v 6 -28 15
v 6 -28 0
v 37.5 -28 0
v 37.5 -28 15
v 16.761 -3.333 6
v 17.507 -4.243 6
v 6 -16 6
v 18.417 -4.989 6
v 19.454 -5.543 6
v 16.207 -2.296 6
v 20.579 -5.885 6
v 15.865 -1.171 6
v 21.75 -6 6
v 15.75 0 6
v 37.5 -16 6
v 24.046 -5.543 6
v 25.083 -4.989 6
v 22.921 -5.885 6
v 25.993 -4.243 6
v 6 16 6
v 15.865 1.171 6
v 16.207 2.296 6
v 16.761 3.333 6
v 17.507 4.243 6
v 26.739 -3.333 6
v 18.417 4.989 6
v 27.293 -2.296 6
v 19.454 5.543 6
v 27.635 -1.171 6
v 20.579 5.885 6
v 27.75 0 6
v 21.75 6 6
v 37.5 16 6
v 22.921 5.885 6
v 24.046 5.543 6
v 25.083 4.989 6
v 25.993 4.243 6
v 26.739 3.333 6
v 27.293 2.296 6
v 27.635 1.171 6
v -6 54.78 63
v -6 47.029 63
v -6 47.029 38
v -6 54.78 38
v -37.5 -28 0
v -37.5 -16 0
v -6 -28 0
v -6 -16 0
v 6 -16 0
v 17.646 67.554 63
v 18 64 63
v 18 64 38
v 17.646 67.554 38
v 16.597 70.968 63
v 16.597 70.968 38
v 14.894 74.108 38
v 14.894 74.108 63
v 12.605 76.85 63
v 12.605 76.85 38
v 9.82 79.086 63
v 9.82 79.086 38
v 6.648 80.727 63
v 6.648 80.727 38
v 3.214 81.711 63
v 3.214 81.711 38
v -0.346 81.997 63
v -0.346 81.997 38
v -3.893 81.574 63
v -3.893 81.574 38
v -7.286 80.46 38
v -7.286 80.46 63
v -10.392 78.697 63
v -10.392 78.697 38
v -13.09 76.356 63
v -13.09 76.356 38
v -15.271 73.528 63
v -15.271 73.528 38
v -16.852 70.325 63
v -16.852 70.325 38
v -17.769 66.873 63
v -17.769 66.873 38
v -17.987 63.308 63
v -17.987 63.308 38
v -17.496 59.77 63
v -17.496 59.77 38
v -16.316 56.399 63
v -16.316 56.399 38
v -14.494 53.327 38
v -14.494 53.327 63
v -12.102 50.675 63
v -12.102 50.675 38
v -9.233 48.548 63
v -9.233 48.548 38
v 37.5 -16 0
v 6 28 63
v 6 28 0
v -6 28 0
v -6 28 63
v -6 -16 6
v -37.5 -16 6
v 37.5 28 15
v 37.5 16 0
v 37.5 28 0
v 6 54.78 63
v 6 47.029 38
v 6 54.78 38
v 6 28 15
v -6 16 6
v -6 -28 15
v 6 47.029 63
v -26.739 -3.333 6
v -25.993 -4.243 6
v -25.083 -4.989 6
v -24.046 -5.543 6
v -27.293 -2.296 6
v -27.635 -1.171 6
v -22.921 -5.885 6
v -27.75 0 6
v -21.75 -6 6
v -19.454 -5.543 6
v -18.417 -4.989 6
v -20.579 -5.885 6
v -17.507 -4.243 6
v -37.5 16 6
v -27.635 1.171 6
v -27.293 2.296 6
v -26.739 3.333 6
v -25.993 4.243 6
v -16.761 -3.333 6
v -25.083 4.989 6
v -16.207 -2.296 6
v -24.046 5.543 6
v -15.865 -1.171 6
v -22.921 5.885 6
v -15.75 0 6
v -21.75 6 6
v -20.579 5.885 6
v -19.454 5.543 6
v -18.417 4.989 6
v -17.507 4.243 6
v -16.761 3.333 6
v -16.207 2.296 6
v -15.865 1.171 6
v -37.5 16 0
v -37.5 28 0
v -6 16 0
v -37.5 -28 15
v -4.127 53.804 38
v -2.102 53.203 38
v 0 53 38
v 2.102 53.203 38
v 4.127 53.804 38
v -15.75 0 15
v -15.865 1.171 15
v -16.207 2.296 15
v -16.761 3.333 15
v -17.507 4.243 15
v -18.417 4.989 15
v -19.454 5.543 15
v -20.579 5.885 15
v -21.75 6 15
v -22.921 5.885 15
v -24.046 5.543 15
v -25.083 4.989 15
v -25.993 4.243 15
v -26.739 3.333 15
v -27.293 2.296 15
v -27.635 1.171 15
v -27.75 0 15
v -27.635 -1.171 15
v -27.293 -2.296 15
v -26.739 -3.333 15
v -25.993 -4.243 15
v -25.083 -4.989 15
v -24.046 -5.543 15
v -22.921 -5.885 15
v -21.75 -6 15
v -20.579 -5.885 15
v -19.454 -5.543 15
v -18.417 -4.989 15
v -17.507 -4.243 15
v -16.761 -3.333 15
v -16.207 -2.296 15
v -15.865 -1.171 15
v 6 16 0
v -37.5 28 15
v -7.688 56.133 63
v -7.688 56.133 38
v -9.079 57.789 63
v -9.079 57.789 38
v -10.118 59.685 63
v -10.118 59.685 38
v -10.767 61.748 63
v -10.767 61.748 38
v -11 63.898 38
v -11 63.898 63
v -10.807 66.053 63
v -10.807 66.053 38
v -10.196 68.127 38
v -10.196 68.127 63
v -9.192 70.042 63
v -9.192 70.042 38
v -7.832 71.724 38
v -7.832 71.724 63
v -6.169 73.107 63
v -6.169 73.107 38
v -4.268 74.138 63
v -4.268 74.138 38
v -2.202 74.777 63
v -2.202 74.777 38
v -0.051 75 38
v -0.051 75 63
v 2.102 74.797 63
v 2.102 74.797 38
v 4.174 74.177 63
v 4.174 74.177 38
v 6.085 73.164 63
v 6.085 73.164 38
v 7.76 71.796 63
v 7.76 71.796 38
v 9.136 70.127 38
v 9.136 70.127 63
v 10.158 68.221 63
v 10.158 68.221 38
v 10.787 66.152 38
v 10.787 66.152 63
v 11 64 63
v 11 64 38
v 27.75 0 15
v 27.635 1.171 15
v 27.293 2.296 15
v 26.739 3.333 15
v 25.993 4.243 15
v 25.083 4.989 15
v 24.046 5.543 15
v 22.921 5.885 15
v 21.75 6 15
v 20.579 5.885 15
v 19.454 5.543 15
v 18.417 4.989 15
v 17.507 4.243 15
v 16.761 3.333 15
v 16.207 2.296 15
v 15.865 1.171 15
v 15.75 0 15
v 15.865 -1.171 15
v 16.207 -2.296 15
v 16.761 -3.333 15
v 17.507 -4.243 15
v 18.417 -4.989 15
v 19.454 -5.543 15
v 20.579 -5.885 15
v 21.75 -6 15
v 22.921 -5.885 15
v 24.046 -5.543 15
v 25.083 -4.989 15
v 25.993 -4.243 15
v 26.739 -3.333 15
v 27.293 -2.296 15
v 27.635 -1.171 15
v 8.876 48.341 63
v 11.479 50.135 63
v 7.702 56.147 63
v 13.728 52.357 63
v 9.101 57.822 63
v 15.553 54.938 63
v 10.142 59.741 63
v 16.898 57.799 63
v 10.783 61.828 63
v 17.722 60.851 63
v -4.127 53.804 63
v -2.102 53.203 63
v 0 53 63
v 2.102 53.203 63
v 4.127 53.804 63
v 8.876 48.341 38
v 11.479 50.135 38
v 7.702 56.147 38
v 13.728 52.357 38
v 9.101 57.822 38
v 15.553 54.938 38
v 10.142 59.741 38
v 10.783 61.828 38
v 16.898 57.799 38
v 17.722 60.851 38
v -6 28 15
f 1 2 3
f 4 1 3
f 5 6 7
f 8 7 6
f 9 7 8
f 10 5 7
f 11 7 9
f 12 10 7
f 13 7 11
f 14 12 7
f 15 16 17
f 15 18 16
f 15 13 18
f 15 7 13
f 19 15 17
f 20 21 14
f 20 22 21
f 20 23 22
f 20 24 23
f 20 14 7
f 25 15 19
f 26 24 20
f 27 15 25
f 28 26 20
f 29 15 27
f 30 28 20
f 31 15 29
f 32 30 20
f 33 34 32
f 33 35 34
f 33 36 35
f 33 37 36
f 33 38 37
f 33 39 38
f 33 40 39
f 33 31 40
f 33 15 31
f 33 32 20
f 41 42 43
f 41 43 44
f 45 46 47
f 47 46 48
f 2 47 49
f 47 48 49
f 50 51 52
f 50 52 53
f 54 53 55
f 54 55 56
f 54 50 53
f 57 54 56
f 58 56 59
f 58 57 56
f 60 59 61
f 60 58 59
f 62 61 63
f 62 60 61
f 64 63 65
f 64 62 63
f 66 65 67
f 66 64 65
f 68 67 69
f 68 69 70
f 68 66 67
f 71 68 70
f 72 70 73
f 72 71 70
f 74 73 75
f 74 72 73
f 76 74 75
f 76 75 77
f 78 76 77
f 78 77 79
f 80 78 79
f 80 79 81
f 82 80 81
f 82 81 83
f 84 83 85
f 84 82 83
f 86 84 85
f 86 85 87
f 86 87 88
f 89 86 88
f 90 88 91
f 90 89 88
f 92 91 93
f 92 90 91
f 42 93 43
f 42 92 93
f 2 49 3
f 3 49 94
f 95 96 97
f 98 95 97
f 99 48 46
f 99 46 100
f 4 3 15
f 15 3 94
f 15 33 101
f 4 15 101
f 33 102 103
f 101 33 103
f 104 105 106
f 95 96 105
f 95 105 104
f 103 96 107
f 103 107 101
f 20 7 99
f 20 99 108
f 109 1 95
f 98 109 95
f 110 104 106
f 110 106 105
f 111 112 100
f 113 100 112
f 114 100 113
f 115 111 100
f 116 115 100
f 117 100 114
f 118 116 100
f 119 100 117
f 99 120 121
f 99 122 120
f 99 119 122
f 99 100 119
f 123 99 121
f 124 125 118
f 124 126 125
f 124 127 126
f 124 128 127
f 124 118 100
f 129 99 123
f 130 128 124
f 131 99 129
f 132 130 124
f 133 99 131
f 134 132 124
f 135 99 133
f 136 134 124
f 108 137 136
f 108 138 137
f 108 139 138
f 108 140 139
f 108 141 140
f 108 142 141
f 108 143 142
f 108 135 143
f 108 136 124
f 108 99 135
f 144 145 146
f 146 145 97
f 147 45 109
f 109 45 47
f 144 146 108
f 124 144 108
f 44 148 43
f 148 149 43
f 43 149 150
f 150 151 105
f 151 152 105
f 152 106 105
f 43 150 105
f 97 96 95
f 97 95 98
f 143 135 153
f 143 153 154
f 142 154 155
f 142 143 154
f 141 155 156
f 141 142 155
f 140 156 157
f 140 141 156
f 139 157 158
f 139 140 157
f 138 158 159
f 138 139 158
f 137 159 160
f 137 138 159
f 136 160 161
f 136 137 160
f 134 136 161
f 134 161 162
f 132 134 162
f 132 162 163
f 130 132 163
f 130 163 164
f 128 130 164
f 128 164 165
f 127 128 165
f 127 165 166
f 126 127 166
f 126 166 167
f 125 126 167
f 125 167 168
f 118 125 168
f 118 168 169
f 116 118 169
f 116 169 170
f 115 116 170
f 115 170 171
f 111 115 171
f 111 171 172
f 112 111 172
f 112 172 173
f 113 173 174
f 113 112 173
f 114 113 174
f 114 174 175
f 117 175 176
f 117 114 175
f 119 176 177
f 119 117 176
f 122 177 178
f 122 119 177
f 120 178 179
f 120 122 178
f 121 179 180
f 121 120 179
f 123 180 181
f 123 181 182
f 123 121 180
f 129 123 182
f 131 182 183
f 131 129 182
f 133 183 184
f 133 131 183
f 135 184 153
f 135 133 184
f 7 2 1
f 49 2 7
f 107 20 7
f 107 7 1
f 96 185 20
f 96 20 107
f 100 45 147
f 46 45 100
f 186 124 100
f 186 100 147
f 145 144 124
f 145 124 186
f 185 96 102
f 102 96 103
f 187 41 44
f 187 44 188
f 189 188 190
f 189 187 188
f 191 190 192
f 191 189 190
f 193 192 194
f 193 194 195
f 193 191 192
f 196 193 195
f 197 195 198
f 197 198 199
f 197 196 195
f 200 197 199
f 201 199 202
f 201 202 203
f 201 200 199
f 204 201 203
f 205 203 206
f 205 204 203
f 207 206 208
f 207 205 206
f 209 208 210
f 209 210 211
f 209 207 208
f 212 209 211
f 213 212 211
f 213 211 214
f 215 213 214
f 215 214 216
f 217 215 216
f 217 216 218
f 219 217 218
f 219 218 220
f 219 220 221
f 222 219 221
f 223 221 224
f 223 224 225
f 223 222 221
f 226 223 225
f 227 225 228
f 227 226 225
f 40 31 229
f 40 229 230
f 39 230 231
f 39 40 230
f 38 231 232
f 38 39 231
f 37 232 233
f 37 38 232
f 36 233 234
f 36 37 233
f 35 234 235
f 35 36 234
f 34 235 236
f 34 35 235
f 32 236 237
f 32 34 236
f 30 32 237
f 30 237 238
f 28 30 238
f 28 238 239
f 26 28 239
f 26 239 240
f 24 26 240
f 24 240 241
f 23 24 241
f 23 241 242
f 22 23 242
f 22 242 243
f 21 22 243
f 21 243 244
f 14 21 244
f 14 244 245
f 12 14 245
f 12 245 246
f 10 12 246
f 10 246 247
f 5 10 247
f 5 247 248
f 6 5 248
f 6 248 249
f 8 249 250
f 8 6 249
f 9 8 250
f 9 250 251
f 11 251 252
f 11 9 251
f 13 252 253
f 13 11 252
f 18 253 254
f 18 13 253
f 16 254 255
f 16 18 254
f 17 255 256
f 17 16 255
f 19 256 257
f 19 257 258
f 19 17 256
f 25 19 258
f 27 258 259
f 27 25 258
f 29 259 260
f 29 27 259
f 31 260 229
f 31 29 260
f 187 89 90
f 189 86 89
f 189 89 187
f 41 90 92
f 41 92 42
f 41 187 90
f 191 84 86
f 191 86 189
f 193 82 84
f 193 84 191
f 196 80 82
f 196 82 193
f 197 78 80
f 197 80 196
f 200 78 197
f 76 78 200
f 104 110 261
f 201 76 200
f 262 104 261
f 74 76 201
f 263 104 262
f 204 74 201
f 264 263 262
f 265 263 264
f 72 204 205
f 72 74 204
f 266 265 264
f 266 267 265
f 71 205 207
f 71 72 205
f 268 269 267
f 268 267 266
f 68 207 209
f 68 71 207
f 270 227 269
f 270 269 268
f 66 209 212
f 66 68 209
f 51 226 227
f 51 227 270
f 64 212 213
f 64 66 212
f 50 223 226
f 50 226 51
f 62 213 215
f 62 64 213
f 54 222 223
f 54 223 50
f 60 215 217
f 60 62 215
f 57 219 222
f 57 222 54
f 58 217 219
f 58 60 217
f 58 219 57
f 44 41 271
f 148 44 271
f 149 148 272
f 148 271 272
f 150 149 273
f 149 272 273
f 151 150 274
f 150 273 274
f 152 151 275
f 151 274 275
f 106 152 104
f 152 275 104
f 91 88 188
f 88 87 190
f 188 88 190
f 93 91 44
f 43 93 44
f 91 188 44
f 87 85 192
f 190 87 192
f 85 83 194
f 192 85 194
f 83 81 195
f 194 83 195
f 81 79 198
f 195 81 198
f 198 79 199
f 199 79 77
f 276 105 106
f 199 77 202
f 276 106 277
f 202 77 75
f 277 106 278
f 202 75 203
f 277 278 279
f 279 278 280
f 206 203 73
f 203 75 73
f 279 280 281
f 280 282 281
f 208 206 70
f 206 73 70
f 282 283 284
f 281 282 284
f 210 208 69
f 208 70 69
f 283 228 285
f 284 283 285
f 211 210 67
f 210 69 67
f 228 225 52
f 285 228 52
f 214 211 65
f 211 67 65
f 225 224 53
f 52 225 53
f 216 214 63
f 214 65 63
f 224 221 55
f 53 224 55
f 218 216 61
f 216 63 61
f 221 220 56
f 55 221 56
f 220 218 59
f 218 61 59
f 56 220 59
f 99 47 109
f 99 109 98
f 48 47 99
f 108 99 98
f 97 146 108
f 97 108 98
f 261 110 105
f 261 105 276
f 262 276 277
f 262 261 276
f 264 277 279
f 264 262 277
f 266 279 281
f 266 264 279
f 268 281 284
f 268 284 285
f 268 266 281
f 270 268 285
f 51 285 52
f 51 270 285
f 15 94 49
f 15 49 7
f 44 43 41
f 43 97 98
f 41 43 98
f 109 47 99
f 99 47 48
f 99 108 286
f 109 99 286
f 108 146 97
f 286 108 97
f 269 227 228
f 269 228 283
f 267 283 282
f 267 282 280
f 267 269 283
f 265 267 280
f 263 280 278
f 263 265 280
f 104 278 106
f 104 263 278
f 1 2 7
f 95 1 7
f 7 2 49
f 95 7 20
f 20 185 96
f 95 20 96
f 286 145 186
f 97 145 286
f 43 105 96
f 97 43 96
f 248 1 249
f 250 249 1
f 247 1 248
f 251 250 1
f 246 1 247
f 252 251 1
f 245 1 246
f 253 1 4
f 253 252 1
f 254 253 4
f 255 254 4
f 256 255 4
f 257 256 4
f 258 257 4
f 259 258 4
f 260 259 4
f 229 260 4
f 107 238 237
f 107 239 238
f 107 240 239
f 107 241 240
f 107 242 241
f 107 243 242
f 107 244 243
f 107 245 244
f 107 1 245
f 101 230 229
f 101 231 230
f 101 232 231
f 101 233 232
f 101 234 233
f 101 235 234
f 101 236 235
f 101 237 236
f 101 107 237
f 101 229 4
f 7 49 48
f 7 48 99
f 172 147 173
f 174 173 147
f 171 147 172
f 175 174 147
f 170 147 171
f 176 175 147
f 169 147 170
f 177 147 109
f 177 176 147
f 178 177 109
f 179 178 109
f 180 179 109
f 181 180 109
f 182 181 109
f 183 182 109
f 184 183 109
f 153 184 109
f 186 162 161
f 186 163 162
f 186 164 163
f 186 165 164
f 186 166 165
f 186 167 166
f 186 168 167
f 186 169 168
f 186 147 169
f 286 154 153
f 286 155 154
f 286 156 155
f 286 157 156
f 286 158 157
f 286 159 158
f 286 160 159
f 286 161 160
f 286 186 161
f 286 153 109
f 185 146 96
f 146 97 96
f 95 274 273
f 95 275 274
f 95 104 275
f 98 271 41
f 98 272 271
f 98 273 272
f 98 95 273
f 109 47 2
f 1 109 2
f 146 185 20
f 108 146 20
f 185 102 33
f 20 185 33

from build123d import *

# Parameters (mm, degrees)
F0_W      = 31.5
F0_H      = 56
F0_R      = 6
F1_DEPTH  = 15
F0_W_2    = 6
F2_DEPTH  = 63
F4_DEPTH  = 25
F5_DEPTH  = 36
F7_DEPTH  = 91.3
F8_DEPTH  = 25
F10_DEPTH = 25
F11_W     = 32
F11_H     = 6
F12_DEPTH = 107.5


with BuildPart() as f1:
    # F0 (on Top) → F1 (new body)
    with BuildSketch(Plane.XY):
        with Locations((-21.75, 0)):
            Rectangle(F0_W, F0_H)
        with Locations((-21.75, 0)):
            Circle(F0_R, mode=Mode.SUBTRACT)
    extrude(amount=F1_DEPTH)


with BuildPart() as f1b:
    # F0 (on Top) → F1, piece 2 (new body)
    with BuildSketch(Plane.XY):
        with Locations((21.75, 0)):
            Rectangle(F0_W, F0_H)
        with Locations((21.75, 0)):
            Circle(F0_R, mode=Mode.SUBTRACT)
    extrude(amount=F1_DEPTH)


with BuildPart() as f2:
    # F0 (on Top) → F2 (new body)
    with BuildSketch(Plane.XY):
        with Locations((3, 0)):
            Rectangle(F0_W_2, F0_H)
        with Locations((-3, 0)):
            Rectangle(F0_W_2, F0_H)
    extrude(amount=F2_DEPTH)

    # F3 (on face) → F4 (cut)
    with BuildSketch(Plane.YZ.offset(6)):
        Polygon((-28, 63), (-28, 15), (28, 63), align=None)
    extrude(amount=-F4_DEPTH, mode=Mode.SUBTRACT)


with BuildPart() as f5:
    # F5 (new): a face of the model
    f5_faces = [f2.part.faces().sort_by_distance(p)[0] for p in [
        (0, 28, 31.5),
    ]]
    extrude(f5_faces, amount=F5_DEPTH)

    # F6 (on face) → F7 (cut)
    with BuildSketch(Plane.XY.offset(63)):
        with BuildLine():
            Line((-6, 64), (-6, 54.7804555427))
            ThreePointArc((-6, 54.7804555427), (0, 53), (6, 54.7804555427))
            Line((6, 54.7804555427), (6, 64))
            Line((6, 64), (-6, 64))
        make_face()
    extrude(amount=-F7_DEPTH, mode=Mode.SUBTRACT)

    # F9 (on face) → F10 (cut)
    with BuildSketch(Plane.YZ.offset(6)):
        Polygon((47.0294372515, 38), (28, 0), (54.7804555427, 0), (54.7804555427, 38), align=None)
    extrude(amount=-F10_DEPTH, mode=Mode.SUBTRACT)


with BuildPart() as f8:
    # F6 (on face) → F8 (new body)
    with BuildSketch(Plane.XY.offset(63)):
        with BuildLine():
            ThreePointArc((-6, 54.7804555427), (-5.2440442409, 73.6695398029), (11, 64))
            ThreePointArc((11, 64), (9.6695398029, 58.7559557591), (6, 54.7804555427))
            Line((6, 54.7804555427), (6, 47.0294372515))
            ThreePointArc((6, 47.0294372515), (14.6969384567, 53.6076951546), (18, 64))
            ThreePointArc((18, 64), (-10.3923048454, 78.6969384567), (-6, 47.0294372515))
            Line((-6, 47.0294372515), (-6, 54.7804555427))
        make_face()
    extrude(amount=-F8_DEPTH)


with BuildPart() as f12_tool:
    # F11 (on face) → F12 (new body)
    with BuildSketch(Plane.YZ.offset(37.5)):
        with Locations((0, 3)):
            Rectangle(F11_W, F11_H)
    extrude(amount=-F12_DEPTH)


with BuildPart() as f1_1:
    add(f1.part)

    # F12: cut by f12_tool
    add(f12_tool.part, mode=Mode.SUBTRACT)


with BuildPart() as f1b_1:
    add(f1b.part)

    # F12: cut by f12_tool
    add(f12_tool.part, mode=Mode.SUBTRACT)


with BuildPart() as f2_1:
    add(f2.part)

    # F12: cut by f12_tool
    add(f12_tool.part, mode=Mode.SUBTRACT)


solid = Compound([f5.part, f8.part, f1_1.part, f1b_1.part, f2_1.part])
